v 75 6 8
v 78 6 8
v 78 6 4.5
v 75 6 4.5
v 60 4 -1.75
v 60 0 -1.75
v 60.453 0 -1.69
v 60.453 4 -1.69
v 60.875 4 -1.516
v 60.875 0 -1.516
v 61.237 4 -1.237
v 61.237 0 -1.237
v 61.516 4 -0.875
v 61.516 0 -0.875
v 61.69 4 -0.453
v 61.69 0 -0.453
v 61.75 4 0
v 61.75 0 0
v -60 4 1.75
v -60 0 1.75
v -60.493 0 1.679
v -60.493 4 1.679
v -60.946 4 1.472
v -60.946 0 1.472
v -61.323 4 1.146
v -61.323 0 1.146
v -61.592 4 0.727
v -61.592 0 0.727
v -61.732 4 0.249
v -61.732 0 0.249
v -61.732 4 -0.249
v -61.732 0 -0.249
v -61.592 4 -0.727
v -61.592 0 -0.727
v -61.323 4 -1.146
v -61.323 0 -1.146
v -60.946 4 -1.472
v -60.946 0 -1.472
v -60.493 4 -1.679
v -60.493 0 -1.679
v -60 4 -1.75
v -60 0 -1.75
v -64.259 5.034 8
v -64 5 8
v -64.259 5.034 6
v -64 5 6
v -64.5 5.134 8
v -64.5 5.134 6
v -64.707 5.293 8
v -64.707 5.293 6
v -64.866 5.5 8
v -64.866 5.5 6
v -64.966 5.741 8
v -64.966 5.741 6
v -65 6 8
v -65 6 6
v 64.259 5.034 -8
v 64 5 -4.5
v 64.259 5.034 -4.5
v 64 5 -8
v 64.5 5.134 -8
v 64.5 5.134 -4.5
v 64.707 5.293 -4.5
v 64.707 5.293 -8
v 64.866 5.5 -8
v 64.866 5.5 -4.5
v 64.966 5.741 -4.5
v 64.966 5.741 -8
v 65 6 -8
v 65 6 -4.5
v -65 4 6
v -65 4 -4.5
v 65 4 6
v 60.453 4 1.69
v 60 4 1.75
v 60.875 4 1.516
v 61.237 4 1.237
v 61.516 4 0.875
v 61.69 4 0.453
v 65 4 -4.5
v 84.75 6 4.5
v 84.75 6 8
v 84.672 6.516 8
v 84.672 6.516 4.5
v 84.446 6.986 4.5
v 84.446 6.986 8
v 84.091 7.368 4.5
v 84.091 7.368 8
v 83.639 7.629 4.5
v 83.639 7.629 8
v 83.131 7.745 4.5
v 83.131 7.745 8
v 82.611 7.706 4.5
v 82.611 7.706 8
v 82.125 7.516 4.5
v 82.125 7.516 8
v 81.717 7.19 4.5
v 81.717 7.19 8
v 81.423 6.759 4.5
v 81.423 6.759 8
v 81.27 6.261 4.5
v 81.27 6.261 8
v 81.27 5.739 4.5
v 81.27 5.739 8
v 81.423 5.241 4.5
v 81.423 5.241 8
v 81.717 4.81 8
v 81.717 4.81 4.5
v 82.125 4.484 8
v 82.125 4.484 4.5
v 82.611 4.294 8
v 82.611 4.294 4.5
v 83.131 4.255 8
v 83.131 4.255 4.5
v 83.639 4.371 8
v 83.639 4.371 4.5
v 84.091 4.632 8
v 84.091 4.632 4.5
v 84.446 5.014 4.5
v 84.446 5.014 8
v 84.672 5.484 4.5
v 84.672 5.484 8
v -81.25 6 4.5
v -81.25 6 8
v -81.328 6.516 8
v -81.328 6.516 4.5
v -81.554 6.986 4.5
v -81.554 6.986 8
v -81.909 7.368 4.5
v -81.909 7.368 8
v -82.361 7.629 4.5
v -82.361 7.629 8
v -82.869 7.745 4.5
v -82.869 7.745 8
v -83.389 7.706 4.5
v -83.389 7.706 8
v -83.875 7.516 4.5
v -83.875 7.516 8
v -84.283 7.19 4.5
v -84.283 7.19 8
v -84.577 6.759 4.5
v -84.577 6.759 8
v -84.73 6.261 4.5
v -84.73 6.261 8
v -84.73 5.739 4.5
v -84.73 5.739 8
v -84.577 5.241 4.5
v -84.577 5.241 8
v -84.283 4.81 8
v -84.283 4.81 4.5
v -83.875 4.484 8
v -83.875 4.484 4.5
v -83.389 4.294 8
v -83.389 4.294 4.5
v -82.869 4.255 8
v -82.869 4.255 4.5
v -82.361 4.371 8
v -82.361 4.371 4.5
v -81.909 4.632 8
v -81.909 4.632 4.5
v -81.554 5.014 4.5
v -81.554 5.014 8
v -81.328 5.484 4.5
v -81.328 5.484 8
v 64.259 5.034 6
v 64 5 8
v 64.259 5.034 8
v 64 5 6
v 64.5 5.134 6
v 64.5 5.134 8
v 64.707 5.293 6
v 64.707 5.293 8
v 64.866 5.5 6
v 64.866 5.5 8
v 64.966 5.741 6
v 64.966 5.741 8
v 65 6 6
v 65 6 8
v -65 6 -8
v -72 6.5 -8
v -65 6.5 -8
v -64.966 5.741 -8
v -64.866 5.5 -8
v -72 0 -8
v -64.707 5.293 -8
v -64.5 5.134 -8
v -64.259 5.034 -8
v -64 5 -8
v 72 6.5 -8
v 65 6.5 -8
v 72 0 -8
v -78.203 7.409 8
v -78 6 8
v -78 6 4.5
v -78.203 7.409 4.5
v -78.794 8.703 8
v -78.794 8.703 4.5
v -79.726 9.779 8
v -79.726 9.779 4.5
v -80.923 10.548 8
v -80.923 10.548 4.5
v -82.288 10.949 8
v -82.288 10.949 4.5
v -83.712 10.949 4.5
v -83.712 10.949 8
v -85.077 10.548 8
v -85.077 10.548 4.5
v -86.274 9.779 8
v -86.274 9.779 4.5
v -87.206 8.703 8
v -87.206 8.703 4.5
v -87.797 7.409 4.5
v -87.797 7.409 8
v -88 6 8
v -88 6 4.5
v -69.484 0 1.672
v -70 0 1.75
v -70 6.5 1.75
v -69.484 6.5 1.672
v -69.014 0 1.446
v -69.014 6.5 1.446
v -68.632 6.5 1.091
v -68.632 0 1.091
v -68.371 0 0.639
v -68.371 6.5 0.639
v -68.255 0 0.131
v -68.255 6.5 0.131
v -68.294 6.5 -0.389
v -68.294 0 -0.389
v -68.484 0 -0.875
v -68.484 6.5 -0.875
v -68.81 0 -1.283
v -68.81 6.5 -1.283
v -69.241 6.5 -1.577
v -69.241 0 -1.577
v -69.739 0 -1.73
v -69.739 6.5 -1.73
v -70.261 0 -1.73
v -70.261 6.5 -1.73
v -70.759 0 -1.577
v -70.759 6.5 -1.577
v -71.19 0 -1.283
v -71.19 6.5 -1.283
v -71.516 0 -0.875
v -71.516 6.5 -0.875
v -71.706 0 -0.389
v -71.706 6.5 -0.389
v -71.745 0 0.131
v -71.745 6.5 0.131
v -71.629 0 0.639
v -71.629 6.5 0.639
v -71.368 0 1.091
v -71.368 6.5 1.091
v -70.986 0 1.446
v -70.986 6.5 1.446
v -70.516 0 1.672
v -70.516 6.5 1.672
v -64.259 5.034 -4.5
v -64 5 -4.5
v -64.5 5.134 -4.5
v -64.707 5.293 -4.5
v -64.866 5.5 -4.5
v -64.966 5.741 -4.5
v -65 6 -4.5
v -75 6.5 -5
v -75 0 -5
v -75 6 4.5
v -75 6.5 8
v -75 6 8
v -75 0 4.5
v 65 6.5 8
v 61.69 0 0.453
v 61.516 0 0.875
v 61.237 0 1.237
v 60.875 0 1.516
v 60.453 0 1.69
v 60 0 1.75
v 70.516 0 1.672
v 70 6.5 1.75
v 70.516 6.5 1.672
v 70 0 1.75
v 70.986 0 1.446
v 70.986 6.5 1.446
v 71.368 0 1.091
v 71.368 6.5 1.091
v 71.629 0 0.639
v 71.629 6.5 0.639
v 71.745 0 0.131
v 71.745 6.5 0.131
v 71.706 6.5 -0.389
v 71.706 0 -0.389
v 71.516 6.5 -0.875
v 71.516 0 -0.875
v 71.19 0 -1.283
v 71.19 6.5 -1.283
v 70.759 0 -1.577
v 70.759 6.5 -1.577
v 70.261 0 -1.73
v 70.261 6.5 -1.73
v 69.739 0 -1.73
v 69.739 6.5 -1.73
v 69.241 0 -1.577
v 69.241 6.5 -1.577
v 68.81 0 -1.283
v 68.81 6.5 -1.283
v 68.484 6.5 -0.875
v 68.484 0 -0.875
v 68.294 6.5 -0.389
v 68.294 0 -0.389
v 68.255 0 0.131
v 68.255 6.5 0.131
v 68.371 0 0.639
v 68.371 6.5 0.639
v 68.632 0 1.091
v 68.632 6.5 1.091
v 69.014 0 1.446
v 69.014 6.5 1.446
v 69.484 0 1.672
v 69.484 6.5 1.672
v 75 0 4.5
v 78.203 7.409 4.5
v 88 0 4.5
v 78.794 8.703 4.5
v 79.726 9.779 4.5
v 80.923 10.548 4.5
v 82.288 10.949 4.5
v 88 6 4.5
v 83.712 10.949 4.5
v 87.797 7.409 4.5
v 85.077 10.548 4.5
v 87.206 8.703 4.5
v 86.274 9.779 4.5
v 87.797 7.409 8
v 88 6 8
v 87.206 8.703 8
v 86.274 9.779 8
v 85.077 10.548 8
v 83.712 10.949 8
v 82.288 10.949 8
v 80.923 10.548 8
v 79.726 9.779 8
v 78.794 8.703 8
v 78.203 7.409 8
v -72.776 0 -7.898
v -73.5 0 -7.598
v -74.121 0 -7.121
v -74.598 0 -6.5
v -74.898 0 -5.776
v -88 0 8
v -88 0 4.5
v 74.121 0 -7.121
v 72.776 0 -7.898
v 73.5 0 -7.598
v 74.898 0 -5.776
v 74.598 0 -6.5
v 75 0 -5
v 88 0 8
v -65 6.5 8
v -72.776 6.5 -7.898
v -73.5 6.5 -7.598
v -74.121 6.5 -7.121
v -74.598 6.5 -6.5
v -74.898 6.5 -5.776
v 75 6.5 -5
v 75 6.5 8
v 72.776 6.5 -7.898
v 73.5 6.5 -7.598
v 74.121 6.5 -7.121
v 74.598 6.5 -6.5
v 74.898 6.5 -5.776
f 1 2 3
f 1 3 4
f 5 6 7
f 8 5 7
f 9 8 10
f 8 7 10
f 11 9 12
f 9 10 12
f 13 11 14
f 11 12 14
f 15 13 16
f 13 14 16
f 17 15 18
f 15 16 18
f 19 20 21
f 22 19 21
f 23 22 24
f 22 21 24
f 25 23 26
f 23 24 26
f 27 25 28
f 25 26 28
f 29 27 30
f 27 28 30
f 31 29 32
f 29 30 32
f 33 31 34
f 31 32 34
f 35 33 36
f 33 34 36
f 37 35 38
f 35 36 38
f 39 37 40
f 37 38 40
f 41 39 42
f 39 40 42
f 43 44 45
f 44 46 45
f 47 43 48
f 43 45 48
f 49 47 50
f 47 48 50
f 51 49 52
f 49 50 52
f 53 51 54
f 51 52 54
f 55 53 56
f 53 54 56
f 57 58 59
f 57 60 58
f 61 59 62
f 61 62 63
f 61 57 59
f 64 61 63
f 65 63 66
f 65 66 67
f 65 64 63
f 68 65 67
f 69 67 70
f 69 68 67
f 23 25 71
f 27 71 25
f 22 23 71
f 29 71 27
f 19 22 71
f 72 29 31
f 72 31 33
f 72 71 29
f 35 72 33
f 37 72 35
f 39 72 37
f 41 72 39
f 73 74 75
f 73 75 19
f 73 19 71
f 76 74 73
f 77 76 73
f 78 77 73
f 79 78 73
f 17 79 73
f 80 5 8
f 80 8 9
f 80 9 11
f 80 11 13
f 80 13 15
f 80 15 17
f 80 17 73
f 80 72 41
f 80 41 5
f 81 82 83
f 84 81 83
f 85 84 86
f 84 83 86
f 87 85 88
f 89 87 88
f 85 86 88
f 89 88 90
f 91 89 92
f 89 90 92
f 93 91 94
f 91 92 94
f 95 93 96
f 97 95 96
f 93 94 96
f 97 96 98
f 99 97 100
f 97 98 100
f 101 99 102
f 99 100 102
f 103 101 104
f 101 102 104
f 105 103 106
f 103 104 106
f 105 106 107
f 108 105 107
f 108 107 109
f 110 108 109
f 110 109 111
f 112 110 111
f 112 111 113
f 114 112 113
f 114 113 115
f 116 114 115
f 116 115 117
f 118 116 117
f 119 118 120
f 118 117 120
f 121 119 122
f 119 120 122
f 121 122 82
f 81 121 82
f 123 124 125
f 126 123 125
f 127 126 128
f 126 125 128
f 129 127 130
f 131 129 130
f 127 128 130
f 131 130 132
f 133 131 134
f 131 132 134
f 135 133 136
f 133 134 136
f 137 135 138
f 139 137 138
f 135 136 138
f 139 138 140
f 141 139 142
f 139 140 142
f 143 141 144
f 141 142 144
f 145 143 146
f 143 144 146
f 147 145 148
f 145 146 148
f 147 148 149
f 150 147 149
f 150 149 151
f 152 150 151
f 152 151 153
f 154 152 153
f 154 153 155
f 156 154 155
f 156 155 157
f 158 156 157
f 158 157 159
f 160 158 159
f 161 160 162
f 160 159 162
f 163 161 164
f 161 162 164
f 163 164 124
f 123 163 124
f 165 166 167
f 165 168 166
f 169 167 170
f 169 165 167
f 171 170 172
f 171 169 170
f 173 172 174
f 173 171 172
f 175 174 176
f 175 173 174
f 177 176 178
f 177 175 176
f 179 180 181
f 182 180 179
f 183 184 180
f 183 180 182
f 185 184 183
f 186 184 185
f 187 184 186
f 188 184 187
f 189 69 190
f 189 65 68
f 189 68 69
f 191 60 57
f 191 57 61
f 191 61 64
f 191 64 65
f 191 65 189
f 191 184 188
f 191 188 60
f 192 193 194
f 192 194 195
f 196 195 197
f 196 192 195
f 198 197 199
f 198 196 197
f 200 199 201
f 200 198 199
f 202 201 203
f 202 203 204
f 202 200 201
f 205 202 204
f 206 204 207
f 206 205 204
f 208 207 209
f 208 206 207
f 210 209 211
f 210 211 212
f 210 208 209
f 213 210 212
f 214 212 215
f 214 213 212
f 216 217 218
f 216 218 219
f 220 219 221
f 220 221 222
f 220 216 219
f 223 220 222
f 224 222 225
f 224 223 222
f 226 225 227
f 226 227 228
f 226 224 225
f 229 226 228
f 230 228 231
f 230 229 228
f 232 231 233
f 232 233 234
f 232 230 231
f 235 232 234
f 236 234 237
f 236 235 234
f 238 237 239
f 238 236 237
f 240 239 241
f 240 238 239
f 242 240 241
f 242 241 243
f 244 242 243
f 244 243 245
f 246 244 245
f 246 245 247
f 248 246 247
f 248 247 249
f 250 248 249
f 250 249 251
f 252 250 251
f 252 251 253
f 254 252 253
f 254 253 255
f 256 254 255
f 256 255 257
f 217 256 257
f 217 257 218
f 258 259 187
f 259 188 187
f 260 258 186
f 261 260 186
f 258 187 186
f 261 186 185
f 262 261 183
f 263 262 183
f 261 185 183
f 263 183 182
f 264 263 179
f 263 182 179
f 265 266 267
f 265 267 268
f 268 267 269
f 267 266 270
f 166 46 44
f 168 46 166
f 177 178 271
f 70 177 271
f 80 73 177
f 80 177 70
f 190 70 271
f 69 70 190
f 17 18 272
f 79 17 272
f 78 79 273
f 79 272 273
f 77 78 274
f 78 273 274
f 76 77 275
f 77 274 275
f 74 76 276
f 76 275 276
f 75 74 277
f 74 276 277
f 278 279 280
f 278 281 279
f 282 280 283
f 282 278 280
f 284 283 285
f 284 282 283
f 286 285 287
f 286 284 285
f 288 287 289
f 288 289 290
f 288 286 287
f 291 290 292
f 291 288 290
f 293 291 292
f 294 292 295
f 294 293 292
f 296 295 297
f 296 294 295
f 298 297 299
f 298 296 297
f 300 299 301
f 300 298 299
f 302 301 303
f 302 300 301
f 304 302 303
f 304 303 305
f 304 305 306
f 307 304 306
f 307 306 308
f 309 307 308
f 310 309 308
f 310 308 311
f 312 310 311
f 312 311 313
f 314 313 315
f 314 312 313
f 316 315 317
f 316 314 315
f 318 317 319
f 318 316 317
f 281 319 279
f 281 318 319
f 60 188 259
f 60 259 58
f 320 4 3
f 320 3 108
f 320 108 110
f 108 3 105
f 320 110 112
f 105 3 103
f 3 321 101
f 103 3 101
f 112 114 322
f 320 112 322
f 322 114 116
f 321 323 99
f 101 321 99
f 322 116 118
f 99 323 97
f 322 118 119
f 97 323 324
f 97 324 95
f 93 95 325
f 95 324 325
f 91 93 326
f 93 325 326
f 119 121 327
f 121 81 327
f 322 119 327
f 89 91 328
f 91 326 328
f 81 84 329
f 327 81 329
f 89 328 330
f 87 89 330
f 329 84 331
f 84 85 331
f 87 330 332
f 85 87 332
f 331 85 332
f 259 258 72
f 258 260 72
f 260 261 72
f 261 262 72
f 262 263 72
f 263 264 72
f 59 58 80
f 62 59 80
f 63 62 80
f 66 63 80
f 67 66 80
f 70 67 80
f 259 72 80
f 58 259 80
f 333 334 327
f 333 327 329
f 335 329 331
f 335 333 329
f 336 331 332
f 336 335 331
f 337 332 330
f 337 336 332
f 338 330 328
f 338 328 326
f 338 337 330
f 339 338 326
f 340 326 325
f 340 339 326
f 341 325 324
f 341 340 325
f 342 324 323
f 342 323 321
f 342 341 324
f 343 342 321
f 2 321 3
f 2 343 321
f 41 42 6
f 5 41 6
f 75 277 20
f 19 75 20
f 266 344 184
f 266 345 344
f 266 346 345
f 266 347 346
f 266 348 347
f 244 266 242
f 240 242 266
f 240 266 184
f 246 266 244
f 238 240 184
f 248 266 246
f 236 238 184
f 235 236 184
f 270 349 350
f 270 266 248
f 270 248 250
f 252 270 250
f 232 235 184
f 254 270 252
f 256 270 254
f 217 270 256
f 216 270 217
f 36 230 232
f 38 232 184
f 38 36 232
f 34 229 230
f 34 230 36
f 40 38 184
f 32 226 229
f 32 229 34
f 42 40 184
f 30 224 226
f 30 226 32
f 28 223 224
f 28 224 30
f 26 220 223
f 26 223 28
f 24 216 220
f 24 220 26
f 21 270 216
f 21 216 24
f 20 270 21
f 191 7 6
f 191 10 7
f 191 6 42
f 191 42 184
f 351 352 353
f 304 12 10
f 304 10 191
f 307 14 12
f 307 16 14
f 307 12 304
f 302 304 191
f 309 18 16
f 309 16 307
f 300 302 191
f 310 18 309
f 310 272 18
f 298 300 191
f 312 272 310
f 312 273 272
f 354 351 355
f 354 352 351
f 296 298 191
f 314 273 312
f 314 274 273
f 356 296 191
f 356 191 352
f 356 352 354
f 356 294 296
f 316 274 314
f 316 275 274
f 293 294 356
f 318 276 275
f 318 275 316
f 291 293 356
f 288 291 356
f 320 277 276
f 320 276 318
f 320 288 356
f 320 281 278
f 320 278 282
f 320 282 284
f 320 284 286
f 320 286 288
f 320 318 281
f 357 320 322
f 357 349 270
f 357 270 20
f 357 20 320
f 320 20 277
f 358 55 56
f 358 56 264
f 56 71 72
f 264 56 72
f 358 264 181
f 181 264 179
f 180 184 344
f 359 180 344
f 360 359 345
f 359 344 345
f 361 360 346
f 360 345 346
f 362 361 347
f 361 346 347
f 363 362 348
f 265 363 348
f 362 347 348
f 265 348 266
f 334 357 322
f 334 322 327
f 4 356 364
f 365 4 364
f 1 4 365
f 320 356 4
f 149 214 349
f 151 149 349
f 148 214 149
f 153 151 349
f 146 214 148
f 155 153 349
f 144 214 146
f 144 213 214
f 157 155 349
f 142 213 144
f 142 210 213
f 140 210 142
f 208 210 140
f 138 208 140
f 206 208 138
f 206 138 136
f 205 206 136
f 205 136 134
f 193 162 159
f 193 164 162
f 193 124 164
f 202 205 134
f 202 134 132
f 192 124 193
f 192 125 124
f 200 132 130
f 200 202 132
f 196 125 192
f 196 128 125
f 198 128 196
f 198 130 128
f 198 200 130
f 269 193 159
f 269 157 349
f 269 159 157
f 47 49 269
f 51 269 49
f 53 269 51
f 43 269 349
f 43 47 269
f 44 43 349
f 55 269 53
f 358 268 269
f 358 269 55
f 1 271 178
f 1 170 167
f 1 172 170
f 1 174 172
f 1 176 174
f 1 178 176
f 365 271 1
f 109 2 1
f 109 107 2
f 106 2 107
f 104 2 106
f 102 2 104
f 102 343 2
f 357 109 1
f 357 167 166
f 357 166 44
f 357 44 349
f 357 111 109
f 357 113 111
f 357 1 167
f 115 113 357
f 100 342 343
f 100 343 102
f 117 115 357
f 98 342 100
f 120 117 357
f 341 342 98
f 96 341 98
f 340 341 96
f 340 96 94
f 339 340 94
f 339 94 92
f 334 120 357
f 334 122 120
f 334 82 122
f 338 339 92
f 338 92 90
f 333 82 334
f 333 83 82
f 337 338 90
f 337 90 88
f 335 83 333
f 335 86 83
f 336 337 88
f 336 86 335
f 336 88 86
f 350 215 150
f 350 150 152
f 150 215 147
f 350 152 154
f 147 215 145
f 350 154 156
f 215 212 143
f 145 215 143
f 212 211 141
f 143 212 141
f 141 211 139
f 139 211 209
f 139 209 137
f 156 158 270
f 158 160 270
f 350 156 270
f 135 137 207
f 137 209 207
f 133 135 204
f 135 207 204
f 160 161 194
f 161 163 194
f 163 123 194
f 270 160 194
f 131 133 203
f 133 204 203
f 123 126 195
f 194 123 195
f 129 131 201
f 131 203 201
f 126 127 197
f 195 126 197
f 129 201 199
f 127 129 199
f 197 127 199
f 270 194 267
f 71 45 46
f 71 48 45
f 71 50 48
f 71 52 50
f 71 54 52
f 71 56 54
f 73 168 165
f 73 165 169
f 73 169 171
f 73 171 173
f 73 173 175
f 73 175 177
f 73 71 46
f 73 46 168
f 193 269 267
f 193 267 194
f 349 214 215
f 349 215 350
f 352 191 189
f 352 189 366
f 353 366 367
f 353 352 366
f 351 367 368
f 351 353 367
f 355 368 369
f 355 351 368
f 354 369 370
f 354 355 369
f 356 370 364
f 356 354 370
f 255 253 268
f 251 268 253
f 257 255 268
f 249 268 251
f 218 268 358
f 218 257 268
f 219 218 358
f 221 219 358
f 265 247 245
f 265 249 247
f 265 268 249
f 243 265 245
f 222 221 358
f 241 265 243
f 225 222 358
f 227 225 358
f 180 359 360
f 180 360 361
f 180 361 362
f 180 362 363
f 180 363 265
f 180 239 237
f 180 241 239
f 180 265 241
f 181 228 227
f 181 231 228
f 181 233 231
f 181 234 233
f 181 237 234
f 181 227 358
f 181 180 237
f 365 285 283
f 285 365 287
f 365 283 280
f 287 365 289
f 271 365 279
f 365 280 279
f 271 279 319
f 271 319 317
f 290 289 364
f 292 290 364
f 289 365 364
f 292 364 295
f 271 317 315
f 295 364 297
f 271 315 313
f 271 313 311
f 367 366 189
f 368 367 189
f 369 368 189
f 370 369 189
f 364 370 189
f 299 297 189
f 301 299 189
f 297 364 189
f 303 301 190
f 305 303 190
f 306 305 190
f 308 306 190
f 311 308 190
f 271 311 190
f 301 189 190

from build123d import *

# Parameters (mm, degrees)
SKETCH1_R           = 1.75
BOSS_EXTRUDE1_DEPTH = 4
SKETCH2_W           = 130
SKETCH2_H           = 10.5
SKETCH2_R           = 1.75
BOSS_EXTRUDE2_DEPTH = 1
SKETCH3_R           = 1.75
BOSS_EXTRUDE3_DEPTH = 1.5
FILLET1_R           = 1
SKETCH4_R           = 1.75
BOSS_EXTRUDE4_DEPTH = 3.5


with BuildPart() as part:
    # Sketch1 → Boss-Extrude1 (new body)
    with BuildSketch(Plane(origin=(0, 0, 0), x_dir=(1, 0, 0), z_dir=(0, 1, 0))):
        with BuildLine():
            Line((-75, -8), (75, -8))
            Line((75, -8), (75, 5))
            ThreePointArc((75, 5), (74.121320344, 7.121320344), (72, 8))
            Line((72, 8), (-72, 8))
            ThreePointArc((-72, 8), (-74.121320344, 7.121320344), (-75, 5))
            Line((-75, 5), (-75, -8))
        make_face()
        with Locations(Location((-70, 0, 0), (0, 0, 270))):
            Circle(SKETCH1_R, mode=Mode.SUBTRACT)
        with BuildLine():
            ThreePointArc((61.75, 0), (61.237436867, -1.237436867), (60, -1.75))
            Line((60, -1.75), (-60, -1.75))
            ThreePointArc((-60, -1.75), (-61.75, 0), (-60, 1.75))
            Line((-60, 1.75), (60, 1.75))
            ThreePointArc((60, 1.75), (61.237436867, 1.237436867), (61.75, 0))
        make_face(mode=Mode.SUBTRACT)
        with Locations(Location((70, 0, 0), (0, 0, 270))):
            Circle(SKETCH1_R, mode=Mode.SUBTRACT)
    extrude(amount=BOSS_EXTRUDE1_DEPTH)

    # Sketch2 → Boss-Extrude2 (add)
    with BuildSketch(Plane(origin=(0, 4, 0), x_dir=(1, 0, 0), z_dir=(0, 1, 0))):
        with BuildLine():
            Line((-75, -8), (75, -8))
            Line((75, -8), (75, 5))
            ThreePointArc((75, 5), (74.121320344, 7.121320344), (72, 8))
            Line((72, 8), (-72, 8))
            ThreePointArc((-72, 8), (-74.121320344, 7.121320344), (-75, 5))
            Line((-75, 5), (-75, -8))
        make_face()
        with Locations((0, -0.75)):
            Rectangle(SKETCH2_W, SKETCH2_H, mode=Mode.SUBTRACT)
        with Locations(Location((-70, 0, 0), (0, 0, 270))):
            Circle(SKETCH2_R, mode=Mode.SUBTRACT)
        with Locations(Location((70, 0, 0), (0, 0, 270))):
            Circle(SKETCH2_R, mode=Mode.SUBTRACT)
    extrude(amount=BOSS_EXTRUDE2_DEPTH)

    # Sketch3 → Boss-Extrude3 (add)
    # profile 1 of 2: a face of its own
    with BuildSketch(Plane(origin=(0, 5, 0), x_dir=(1, 0, 0), z_dir=(0, 1, 0))):
        with BuildLine():
            Line((65, 4.5), (65, 8))
            Line((65, 8), (72, 8))
            ThreePointArc((72, 8), (74.121320344, 7.121320344), (75, 5))
            Line((75, 5), (75, -8))
            Line((75, -8), (65, -8))
            Line((65, -8), (65, -6))
            Line((65, -6), (65, 4.5))
        make_face()
        with Locations(Location((70, 0, 0), (0, 0, 270))):
            Circle(SKETCH3_R, mode=Mode.SUBTRACT)
    # profile 2 of 2: a face of its own
    with BuildSketch(Plane(origin=(0, 5, 0), x_dir=(1, 0, 0), z_dir=(0, 1, 0))):
        with BuildLine():
            Line((-65, 4.5), (-65, 8))
            Line((-65, 8), (-72, 8))
            ThreePointArc((-72, 8), (-74.121320344, 7.121320344), (-75, 5))
            Line((-75, 5), (-75, -8))
            Line((-75, -8), (-65, -8))
            Line((-65, -8), (-65, -6))
            Line((-65, -6), (-65, 4.5))
        make_face()
        with Locations(Location((-70, 0, 0), (0, 0, 270))):
            Circle(SKETCH3_R, mode=Mode.SUBTRACT)
    extrude(amount=BOSS_EXTRUDE3_DEPTH)

    # Fillet1
    fillet1_edges = [part.edges().sort_by_distance(p)[0] for p in [
        (-65, 5, 7),
        (65, 5, 7),
        (65, 5, -6.25),
        (-65, 5, -6.25),
    ]]
    fillet(fillet1_edges, radius=FILLET1_R)

    # Sketch4 → Boss-Extrude4 (add)
    # profile 1 of 2: a face of its own
    with BuildSketch(Plane.XY.offset(8)):
        with BuildLine():
            Line((-88, 0), (-75, 0))
            Line((-75, 0), (-75, 6))
            Line((-75, 6), (-78, 6))
            ThreePointArc((-78, 6), (-83, 11), (-88, 6))
            Line((-88, 6), (-88, 0))
        make_face()
        with Locations((-83, 6)):
            Circle(SKETCH4_R, mode=Mode.SUBTRACT)
    # profile 2 of 2: a face of its own
    with BuildSketch(Plane.XY.offset(8)):
        with BuildLine():
            Line((78, 6), (75, 6))
            Line((75, 6), (75, 0))
            Line((75, 0), (88, 0))
            Line((88, 0), (88, 6))
            ThreePointArc((88, 6), (83, 11), (78, 6))
        make_face()
        with Locations((83, 6)):
            Circle(SKETCH4_R, mode=Mode.SUBTRACT)
    extrude(amount=-BOSS_EXTRUDE4_DEPTH)


solid = part.part
